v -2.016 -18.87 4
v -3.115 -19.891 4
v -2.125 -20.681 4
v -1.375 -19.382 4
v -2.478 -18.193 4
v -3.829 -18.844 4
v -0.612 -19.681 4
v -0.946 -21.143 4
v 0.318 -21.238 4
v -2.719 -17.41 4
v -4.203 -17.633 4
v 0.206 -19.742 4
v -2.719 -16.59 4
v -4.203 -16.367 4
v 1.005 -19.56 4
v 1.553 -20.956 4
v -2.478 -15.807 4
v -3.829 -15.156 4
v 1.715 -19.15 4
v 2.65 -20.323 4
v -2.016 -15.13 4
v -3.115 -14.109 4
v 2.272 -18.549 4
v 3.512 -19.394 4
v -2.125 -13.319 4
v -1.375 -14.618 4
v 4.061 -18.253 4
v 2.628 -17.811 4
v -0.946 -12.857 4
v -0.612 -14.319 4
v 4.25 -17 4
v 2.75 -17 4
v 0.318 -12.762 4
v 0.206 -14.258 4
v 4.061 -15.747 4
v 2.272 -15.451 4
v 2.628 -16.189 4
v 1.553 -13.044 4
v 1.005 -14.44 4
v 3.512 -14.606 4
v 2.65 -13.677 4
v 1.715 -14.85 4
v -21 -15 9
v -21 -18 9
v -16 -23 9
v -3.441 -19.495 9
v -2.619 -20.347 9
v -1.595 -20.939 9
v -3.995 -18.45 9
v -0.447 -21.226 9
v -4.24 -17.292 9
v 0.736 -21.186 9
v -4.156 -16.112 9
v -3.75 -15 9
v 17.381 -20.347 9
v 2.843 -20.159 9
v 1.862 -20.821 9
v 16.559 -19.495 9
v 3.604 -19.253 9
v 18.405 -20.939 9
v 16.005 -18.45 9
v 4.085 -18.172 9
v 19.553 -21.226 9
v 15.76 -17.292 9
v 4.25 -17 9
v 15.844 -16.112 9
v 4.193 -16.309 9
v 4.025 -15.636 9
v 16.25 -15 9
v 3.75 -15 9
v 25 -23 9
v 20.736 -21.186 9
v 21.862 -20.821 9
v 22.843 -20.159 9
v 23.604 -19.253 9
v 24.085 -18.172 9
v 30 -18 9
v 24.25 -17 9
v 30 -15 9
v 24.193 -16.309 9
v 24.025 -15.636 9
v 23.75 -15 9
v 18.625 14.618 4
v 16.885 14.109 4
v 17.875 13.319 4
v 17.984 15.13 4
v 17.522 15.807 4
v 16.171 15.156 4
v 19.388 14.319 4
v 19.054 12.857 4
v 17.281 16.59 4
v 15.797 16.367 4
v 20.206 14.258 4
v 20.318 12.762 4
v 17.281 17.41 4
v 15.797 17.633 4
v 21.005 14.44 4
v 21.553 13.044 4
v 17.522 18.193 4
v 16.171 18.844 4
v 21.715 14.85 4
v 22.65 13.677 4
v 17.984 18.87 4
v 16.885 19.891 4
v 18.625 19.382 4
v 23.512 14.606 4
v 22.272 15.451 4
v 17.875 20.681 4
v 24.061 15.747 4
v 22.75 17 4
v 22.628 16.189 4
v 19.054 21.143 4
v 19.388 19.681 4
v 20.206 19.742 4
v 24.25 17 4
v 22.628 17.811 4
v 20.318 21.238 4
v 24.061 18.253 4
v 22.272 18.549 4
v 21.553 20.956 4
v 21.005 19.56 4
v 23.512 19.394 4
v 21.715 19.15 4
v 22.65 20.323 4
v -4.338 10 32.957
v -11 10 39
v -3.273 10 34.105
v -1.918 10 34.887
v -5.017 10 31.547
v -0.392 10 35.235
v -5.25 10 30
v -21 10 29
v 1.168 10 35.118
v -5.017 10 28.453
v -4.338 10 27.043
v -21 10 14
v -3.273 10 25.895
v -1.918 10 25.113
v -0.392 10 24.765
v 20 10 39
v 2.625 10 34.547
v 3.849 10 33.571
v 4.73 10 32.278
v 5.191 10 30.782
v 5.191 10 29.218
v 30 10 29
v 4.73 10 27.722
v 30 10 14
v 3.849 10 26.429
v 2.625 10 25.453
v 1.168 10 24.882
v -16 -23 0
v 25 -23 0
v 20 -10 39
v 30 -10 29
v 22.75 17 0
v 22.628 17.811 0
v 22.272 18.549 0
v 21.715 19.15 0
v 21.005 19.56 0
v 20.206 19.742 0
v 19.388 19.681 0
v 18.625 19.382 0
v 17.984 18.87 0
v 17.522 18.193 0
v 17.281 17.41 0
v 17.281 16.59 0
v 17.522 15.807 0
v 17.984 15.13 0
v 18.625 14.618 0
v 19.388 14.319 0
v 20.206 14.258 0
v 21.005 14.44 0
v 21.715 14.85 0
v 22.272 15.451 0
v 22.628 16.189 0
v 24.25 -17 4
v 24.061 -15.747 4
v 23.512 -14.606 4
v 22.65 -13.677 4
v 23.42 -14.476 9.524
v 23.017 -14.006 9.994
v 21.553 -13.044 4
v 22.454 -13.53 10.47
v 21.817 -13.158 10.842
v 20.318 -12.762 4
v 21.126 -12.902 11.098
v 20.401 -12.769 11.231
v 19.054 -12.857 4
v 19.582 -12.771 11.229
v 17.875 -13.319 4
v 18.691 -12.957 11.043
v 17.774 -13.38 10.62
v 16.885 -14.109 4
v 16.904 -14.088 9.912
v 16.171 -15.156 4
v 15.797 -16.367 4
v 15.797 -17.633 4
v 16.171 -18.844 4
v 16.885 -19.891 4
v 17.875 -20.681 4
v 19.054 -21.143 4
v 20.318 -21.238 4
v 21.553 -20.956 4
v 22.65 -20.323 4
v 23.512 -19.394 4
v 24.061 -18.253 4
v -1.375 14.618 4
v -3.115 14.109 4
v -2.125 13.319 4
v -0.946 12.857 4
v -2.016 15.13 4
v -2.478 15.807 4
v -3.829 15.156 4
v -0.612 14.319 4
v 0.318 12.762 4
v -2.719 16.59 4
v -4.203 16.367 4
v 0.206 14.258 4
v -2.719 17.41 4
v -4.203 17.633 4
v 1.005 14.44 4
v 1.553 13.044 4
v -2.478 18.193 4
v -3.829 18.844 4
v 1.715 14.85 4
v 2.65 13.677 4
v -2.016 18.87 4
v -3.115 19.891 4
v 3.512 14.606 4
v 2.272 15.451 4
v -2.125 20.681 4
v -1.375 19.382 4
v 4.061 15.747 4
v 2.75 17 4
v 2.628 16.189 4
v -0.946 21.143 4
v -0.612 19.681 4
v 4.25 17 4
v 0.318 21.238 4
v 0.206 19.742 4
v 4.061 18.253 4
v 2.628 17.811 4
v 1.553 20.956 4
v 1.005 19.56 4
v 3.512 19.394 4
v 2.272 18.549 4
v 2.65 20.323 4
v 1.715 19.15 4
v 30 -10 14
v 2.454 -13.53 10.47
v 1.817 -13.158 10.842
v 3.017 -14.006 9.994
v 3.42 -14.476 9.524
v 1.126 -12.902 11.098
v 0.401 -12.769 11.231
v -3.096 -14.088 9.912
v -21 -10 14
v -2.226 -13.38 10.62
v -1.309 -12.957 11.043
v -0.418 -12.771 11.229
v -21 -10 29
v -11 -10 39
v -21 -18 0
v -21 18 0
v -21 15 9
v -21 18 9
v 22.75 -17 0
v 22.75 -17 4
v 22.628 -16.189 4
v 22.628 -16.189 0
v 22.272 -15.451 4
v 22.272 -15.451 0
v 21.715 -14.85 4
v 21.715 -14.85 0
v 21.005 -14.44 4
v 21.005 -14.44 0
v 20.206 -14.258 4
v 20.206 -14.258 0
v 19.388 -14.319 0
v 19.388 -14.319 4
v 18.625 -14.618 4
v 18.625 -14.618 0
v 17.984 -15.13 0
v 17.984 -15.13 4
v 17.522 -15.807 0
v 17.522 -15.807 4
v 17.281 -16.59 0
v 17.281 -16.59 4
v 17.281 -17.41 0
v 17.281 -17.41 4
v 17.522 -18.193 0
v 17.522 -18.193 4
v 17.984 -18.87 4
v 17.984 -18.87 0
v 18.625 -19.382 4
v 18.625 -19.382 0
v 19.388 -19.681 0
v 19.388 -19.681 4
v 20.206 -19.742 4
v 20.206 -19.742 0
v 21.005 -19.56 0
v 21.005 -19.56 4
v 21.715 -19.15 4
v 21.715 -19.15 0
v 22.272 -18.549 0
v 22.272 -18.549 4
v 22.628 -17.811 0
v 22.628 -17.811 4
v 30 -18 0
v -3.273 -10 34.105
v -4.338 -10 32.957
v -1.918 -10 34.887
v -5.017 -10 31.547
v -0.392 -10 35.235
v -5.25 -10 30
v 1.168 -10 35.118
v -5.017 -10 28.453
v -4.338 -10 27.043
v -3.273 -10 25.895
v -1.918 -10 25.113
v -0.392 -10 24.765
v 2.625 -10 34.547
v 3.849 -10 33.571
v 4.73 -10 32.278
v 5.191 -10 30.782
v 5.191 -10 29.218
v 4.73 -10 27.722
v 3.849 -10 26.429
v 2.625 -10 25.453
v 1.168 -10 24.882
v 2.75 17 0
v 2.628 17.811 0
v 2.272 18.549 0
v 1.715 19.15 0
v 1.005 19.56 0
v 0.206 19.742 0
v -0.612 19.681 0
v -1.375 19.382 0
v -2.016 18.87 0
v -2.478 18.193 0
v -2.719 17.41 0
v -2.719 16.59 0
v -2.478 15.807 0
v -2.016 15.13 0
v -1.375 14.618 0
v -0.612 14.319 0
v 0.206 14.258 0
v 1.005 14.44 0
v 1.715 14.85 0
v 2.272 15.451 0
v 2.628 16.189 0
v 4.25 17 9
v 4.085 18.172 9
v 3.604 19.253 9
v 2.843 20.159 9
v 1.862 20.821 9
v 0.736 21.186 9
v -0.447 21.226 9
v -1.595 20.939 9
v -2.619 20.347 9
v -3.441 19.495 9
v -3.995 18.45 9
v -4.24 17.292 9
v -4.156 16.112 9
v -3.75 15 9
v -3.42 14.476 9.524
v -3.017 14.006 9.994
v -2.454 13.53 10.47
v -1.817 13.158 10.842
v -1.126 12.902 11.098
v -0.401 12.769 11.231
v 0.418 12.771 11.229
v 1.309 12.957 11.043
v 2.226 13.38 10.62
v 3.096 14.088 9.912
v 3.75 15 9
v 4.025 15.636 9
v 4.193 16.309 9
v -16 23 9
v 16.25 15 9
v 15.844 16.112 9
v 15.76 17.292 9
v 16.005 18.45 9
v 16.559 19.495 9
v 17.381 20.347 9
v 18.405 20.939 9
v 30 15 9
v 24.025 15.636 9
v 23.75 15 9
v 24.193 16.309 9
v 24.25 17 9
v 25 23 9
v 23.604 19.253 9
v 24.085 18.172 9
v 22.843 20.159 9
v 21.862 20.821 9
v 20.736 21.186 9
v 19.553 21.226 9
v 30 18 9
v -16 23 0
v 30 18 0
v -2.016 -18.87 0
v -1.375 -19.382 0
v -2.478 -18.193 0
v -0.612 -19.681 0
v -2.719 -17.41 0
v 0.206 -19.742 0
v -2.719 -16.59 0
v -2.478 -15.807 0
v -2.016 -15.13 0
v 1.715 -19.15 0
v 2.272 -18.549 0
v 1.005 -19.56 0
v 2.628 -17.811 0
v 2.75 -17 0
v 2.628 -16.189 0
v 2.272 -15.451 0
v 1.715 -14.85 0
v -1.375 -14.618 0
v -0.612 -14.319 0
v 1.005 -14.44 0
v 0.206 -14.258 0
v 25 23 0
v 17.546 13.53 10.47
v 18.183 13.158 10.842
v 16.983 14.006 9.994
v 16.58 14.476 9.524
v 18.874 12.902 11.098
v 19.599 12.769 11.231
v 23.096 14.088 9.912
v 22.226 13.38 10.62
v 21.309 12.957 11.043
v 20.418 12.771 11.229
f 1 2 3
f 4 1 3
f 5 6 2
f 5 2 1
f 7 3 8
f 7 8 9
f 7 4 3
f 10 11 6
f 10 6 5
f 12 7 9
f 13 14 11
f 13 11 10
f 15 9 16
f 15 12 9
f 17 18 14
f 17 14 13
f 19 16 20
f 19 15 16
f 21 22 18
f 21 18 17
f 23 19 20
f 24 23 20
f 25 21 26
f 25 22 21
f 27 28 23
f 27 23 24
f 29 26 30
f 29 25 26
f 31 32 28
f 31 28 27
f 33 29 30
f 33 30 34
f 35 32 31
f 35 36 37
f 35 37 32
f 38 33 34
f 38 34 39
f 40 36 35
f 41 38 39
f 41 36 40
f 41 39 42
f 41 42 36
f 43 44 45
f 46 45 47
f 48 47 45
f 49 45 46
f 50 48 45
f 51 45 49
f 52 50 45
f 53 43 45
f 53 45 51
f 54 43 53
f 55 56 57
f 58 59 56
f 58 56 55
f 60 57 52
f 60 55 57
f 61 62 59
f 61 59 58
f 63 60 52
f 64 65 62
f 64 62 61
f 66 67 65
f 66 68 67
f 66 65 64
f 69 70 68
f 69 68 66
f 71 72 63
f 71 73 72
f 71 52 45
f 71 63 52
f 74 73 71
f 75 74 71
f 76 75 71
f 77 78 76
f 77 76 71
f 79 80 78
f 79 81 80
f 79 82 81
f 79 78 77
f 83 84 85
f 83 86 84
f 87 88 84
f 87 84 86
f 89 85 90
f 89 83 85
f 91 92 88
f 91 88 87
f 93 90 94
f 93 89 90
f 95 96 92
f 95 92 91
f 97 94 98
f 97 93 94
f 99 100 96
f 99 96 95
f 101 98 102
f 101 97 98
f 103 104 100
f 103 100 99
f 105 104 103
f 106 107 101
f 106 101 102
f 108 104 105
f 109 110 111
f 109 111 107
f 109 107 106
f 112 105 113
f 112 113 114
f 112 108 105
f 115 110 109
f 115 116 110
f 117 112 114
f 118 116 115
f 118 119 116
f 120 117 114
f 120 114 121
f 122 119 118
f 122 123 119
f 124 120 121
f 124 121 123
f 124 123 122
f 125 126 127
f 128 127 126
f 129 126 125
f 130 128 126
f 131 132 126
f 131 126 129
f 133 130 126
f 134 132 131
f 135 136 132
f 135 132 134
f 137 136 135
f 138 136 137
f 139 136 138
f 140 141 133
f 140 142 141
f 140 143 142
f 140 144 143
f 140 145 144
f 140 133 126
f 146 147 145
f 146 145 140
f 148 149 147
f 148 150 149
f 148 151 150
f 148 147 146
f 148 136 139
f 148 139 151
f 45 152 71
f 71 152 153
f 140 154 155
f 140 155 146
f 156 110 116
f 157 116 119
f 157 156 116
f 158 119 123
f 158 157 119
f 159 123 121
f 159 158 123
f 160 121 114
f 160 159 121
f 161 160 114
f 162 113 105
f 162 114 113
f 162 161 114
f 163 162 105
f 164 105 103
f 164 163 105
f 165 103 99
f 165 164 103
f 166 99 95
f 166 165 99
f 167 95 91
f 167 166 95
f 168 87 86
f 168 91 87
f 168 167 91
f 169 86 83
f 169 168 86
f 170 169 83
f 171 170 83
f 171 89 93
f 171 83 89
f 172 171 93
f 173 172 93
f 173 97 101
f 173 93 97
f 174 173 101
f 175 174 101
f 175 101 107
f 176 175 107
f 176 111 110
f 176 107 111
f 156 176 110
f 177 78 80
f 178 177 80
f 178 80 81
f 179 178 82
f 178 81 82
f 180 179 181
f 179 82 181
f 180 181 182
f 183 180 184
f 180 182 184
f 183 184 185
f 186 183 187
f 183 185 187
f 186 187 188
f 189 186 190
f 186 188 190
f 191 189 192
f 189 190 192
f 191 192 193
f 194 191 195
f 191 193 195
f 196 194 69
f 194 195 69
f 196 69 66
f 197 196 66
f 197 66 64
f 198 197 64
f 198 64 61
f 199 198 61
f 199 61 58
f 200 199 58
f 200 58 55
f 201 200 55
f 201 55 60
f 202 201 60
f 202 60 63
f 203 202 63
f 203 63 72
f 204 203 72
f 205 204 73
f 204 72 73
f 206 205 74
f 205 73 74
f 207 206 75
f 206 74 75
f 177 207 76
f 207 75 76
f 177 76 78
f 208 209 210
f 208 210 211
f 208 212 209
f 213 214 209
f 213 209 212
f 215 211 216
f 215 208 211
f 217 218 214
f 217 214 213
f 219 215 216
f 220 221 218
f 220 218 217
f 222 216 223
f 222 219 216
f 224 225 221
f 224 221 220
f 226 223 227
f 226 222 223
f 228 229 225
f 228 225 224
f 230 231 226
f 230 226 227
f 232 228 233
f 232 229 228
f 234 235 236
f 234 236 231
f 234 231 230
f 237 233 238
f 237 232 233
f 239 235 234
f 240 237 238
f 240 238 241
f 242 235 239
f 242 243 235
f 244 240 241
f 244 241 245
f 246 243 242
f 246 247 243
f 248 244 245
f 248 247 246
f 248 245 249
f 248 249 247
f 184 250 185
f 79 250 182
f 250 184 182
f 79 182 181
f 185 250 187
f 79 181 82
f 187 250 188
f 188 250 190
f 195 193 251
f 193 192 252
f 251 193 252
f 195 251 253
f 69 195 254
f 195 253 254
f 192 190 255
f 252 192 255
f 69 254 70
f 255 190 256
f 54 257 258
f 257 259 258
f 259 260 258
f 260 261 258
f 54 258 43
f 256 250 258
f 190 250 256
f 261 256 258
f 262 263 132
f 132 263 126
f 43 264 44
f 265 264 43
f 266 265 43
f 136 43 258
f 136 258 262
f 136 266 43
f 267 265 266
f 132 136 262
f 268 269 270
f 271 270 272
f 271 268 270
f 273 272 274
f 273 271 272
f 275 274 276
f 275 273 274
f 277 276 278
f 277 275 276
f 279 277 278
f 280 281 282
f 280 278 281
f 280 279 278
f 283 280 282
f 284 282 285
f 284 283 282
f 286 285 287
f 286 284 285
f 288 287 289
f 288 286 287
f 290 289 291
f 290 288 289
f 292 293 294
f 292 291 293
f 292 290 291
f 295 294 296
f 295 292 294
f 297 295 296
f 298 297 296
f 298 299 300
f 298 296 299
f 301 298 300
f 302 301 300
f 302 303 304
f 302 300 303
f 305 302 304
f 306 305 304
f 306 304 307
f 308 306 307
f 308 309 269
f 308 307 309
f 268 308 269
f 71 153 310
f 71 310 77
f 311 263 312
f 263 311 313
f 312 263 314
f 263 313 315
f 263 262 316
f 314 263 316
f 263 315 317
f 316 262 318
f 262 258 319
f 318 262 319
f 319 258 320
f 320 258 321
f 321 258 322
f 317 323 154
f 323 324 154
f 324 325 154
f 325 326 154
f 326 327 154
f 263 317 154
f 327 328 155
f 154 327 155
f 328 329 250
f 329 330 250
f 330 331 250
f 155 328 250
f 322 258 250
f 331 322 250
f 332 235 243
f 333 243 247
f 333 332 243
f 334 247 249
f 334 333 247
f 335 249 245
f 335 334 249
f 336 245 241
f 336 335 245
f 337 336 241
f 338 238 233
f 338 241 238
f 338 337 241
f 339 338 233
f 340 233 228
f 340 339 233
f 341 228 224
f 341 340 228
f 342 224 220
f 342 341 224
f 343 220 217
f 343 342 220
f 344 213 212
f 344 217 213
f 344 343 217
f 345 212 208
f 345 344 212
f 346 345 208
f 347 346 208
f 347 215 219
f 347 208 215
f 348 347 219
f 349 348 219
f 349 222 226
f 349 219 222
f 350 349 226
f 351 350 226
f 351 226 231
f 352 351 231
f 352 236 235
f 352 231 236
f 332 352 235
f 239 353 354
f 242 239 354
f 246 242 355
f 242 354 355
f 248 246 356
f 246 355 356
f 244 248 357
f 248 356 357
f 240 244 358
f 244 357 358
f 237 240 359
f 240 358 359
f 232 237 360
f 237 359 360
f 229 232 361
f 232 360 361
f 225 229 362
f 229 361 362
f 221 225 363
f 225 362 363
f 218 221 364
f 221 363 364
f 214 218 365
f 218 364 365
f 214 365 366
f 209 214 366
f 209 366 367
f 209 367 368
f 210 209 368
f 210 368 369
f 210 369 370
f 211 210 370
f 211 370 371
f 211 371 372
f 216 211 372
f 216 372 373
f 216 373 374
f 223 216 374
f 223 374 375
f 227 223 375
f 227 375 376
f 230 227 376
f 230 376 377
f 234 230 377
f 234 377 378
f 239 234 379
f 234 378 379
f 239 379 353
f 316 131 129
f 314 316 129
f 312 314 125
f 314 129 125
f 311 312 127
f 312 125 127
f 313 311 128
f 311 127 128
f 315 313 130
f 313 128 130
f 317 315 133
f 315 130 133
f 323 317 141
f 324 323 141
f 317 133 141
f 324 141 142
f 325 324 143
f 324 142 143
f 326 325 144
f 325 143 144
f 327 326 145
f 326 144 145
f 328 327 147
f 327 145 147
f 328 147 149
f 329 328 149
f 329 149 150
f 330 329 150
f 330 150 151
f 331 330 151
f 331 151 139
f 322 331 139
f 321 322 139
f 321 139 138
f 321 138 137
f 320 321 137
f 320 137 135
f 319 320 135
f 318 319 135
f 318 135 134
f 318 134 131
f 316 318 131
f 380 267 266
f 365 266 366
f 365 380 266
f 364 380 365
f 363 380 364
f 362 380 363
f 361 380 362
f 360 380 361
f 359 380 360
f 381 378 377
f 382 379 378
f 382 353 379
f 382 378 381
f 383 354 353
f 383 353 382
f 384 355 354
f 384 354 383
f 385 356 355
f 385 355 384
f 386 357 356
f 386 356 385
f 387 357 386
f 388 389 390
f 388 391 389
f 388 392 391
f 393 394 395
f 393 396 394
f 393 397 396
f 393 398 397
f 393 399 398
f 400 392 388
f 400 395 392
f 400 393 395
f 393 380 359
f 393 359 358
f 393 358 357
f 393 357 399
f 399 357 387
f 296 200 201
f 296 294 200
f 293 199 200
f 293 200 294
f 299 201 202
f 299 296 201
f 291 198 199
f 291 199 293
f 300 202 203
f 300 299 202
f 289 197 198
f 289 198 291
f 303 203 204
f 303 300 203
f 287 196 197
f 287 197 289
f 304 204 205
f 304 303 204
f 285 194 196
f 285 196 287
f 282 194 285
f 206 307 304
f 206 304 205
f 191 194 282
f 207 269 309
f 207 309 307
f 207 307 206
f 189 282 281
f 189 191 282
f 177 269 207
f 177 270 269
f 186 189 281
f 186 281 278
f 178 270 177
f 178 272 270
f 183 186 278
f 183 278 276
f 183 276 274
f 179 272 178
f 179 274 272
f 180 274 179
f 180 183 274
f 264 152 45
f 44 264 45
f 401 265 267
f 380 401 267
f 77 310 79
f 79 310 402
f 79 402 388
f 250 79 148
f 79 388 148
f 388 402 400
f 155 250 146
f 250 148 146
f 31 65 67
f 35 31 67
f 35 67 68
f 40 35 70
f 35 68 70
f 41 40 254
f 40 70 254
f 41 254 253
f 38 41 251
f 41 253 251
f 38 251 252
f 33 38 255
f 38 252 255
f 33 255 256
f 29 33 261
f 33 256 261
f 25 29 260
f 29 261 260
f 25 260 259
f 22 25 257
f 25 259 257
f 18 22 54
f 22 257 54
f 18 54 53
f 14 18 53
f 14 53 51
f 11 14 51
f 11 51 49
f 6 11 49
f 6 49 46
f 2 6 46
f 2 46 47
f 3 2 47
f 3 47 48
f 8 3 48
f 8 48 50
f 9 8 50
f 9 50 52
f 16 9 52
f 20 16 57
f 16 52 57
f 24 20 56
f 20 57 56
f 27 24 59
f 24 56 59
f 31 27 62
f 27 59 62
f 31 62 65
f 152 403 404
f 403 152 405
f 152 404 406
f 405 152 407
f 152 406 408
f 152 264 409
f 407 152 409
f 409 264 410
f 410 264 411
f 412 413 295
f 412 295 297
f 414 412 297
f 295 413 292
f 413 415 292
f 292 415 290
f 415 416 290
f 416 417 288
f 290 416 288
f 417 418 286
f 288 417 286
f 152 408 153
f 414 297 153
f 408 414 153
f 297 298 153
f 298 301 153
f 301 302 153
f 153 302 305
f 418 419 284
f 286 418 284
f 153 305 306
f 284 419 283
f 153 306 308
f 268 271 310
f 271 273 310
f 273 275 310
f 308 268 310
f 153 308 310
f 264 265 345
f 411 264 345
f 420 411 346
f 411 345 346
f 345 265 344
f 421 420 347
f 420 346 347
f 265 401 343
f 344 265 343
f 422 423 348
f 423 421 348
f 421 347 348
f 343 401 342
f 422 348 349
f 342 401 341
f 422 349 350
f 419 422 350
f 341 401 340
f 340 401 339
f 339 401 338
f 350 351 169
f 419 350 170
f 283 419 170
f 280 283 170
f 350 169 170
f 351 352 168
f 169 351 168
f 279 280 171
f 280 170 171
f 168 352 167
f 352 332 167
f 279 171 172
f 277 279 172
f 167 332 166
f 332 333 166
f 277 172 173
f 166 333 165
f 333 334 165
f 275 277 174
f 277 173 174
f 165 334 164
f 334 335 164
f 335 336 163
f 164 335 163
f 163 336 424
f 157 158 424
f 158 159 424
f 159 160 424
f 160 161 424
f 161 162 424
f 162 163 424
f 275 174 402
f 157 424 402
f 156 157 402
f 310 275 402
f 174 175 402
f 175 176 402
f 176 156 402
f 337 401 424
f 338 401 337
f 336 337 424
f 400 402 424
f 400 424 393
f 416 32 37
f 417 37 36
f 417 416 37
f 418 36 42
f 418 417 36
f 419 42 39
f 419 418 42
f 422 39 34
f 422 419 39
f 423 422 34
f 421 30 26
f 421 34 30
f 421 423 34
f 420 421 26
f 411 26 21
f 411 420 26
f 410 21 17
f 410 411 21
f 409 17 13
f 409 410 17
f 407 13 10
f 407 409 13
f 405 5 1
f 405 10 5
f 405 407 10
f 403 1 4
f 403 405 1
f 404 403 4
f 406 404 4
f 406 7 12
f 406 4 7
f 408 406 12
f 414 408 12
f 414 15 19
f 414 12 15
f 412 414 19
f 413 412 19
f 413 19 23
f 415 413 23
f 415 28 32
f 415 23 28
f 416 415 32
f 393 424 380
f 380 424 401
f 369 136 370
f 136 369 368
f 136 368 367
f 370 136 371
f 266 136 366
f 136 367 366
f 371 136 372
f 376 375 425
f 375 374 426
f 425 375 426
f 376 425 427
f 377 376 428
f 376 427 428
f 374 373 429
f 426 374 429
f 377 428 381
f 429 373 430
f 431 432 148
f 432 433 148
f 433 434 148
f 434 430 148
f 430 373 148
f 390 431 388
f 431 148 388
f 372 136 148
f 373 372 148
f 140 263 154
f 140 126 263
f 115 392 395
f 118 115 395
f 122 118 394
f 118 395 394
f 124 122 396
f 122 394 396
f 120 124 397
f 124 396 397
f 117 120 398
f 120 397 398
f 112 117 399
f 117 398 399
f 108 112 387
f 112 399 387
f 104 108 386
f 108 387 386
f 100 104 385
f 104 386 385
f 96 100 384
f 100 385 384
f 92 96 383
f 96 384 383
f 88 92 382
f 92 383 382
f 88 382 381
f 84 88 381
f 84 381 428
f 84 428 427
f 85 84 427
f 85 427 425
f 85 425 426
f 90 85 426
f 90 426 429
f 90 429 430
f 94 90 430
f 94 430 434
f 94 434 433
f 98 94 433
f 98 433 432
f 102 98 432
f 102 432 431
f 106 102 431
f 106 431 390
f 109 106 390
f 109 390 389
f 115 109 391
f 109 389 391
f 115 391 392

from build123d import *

# Parameters (mm, degrees)
SKETCH_1_R          = 2.75
EXTRUDE_1_DEPTH     = 9
SKETCH_6_R          = 4.25
CUT_EXTRUDE_3_DEPTH = 5
CHAMFER_2_SIZE      = 5
SKETCH_8_W          = 51
SKETCH_8_H          = 20
EXTRUDE_2_DEPTH     = 30
SKETCH_9_R          = 5.25
CUT_EXTRUDE_4_DEPTH = 60.245252974
CHAMFER_3_SIZE      = 10
CHAMFER_4_SIZE      = 5


with BuildPart() as part:
    # 草圖1 → 填料-伸長1 (new body)
    with BuildSketch(Plane.XY):
        Polygon((30, 23), (21, 23), (-21, 23), (-21, -23), (21, -23), (30, -23), align=None)
        with Locations((0, 17)):
            Circle(SKETCH_1_R, mode=Mode.SUBTRACT)
        with Locations((20, 17)):
            Circle(SKETCH_1_R, mode=Mode.SUBTRACT)
        with Locations((20, -17)):
            Circle(SKETCH_1_R, mode=Mode.SUBTRACT)
        with Locations((0, -17)):
            Circle(SKETCH_1_R, mode=Mode.SUBTRACT)
    extrude(amount=EXTRUDE_1_DEPTH)

    # 草圖6 → 除料-伸長3 (cut)
    with BuildSketch(Plane.XY.offset(9)):
        with Locations((0, 17)):
            Circle(SKETCH_6_R)
        with Locations((20, 17)):
            Circle(SKETCH_6_R)
        with Locations((20, -17)):
            Circle(SKETCH_6_R)
        with Locations((0, -17)):
            Circle(SKETCH_6_R)
    extrude(amount=-CUT_EXTRUDE_3_DEPTH, mode=Mode.SUBTRACT)

    # 導角2
    chamfer_2_edges = [part.edges().sort_by_distance(p)[0] for p in [
        (-21, 23, 4.5),
        (30, 23, 4.5),
        (30, -23, 4.5),
        (-21, -23, 4.5),
    ]]
    chamfer(chamfer_2_edges, length=CHAMFER_2_SIZE)

    # 草圖8 → 填料-伸長2 (add)
    with BuildSketch(Plane.XY.offset(9)):
        with Locations((4.5, 0)):
            Rectangle(SKETCH_8_W, SKETCH_8_H)
    extrude(amount=EXTRUDE_2_DEPTH)

    # 草圖9 → 除料-伸長4 (cut, through all)
    with BuildSketch(Plane(origin=(0, 10, 0), x_dir=(1, 0, 0), z_dir=(0, 1, 0))):
        with Locations(Location((0, -30, 0), (0, 0, 180))):
            Circle(SKETCH_9_R)
    extrude(amount=-CUT_EXTRUDE_4_DEPTH, mode=Mode.SUBTRACT)

    # 導角3
    chamfer_3_edges = [part.edges().sort_by_distance(p)[0] for p in [
        (-21, 0, 39),
        (30, 0, 39),
    ]]
    chamfer(chamfer_3_edges, length=CHAMFER_3_SIZE)

    # 導角4
    # the kernel refuses this chamfer: 5 mm, written as the material it adds along each edge
    with BuildSketch(Plane(origin=(-21, -10, 9), x_dir=(0, 0.027495876610586317, 0.9996219169112968), z_dir=(1, 0, 0))) as chamfer_4_piece_1_section:
        Polygon((CHAMFER_4_SIZE * 0.999621916911, CHAMFER_4_SIZE * 0.0274958766106), (-CHAMFER_4_SIZE * 0.0274958766106, CHAMFER_4_SIZE * 0.999621916911), (0, 0), align=None)
    chamfer_4_piece_1 = extrude(amount=51, mode=Mode.PRIVATE)
    chamfer_4_piece_1 = chamfer_4_piece_1 - Plane(origin=(0, -17, 10.693214972), x_dir=(1, 0, 0), z_dir=(0, 0, 1)) * Cylinder(4.25, 122, mode=Mode.PRIVATE)
    chamfer_4_piece_1 = chamfer_4_piece_1 - Plane(origin=(20, -17, 10.693214972), x_dir=(1, 0, 0), z_dir=(0, 0, 1)) * Cylinder(4.25, 122, mode=Mode.PRIVATE)
    add(chamfer_4_piece_1)
    with BuildSketch(Plane(origin=(30, 10, 9), x_dir=(0, -0.027495876610586317, 0.9996219169112968), z_dir=(-1, 0, 0))) as chamfer_4_piece_2_section:
        Polygon((CHAMFER_4_SIZE * 0.999621916911, CHAMFER_4_SIZE * 0.0274958766106), (-CHAMFER_4_SIZE * 0.0274958766106, CHAMFER_4_SIZE * 0.999621916911), (0, 0), align=None)
    chamfer_4_piece_2 = extrude(amount=51, mode=Mode.PRIVATE)
    chamfer_4_piece_2 = chamfer_4_piece_2 - Plane(origin=(0, 17, 10.693214972), x_dir=(1, 0, 0), z_dir=(0, 0, 1)) * Cylinder(4.25, 122, mode=Mode.PRIVATE)
    chamfer_4_piece_2 = chamfer_4_piece_2 - Plane(origin=(20, 17, 10.693214972), x_dir=(1, 0, 0), z_dir=(0, 0, 1)) * Cylinder(4.25, 122, mode=Mode.PRIVATE)
    add(chamfer_4_piece_2)


solid = part.part
